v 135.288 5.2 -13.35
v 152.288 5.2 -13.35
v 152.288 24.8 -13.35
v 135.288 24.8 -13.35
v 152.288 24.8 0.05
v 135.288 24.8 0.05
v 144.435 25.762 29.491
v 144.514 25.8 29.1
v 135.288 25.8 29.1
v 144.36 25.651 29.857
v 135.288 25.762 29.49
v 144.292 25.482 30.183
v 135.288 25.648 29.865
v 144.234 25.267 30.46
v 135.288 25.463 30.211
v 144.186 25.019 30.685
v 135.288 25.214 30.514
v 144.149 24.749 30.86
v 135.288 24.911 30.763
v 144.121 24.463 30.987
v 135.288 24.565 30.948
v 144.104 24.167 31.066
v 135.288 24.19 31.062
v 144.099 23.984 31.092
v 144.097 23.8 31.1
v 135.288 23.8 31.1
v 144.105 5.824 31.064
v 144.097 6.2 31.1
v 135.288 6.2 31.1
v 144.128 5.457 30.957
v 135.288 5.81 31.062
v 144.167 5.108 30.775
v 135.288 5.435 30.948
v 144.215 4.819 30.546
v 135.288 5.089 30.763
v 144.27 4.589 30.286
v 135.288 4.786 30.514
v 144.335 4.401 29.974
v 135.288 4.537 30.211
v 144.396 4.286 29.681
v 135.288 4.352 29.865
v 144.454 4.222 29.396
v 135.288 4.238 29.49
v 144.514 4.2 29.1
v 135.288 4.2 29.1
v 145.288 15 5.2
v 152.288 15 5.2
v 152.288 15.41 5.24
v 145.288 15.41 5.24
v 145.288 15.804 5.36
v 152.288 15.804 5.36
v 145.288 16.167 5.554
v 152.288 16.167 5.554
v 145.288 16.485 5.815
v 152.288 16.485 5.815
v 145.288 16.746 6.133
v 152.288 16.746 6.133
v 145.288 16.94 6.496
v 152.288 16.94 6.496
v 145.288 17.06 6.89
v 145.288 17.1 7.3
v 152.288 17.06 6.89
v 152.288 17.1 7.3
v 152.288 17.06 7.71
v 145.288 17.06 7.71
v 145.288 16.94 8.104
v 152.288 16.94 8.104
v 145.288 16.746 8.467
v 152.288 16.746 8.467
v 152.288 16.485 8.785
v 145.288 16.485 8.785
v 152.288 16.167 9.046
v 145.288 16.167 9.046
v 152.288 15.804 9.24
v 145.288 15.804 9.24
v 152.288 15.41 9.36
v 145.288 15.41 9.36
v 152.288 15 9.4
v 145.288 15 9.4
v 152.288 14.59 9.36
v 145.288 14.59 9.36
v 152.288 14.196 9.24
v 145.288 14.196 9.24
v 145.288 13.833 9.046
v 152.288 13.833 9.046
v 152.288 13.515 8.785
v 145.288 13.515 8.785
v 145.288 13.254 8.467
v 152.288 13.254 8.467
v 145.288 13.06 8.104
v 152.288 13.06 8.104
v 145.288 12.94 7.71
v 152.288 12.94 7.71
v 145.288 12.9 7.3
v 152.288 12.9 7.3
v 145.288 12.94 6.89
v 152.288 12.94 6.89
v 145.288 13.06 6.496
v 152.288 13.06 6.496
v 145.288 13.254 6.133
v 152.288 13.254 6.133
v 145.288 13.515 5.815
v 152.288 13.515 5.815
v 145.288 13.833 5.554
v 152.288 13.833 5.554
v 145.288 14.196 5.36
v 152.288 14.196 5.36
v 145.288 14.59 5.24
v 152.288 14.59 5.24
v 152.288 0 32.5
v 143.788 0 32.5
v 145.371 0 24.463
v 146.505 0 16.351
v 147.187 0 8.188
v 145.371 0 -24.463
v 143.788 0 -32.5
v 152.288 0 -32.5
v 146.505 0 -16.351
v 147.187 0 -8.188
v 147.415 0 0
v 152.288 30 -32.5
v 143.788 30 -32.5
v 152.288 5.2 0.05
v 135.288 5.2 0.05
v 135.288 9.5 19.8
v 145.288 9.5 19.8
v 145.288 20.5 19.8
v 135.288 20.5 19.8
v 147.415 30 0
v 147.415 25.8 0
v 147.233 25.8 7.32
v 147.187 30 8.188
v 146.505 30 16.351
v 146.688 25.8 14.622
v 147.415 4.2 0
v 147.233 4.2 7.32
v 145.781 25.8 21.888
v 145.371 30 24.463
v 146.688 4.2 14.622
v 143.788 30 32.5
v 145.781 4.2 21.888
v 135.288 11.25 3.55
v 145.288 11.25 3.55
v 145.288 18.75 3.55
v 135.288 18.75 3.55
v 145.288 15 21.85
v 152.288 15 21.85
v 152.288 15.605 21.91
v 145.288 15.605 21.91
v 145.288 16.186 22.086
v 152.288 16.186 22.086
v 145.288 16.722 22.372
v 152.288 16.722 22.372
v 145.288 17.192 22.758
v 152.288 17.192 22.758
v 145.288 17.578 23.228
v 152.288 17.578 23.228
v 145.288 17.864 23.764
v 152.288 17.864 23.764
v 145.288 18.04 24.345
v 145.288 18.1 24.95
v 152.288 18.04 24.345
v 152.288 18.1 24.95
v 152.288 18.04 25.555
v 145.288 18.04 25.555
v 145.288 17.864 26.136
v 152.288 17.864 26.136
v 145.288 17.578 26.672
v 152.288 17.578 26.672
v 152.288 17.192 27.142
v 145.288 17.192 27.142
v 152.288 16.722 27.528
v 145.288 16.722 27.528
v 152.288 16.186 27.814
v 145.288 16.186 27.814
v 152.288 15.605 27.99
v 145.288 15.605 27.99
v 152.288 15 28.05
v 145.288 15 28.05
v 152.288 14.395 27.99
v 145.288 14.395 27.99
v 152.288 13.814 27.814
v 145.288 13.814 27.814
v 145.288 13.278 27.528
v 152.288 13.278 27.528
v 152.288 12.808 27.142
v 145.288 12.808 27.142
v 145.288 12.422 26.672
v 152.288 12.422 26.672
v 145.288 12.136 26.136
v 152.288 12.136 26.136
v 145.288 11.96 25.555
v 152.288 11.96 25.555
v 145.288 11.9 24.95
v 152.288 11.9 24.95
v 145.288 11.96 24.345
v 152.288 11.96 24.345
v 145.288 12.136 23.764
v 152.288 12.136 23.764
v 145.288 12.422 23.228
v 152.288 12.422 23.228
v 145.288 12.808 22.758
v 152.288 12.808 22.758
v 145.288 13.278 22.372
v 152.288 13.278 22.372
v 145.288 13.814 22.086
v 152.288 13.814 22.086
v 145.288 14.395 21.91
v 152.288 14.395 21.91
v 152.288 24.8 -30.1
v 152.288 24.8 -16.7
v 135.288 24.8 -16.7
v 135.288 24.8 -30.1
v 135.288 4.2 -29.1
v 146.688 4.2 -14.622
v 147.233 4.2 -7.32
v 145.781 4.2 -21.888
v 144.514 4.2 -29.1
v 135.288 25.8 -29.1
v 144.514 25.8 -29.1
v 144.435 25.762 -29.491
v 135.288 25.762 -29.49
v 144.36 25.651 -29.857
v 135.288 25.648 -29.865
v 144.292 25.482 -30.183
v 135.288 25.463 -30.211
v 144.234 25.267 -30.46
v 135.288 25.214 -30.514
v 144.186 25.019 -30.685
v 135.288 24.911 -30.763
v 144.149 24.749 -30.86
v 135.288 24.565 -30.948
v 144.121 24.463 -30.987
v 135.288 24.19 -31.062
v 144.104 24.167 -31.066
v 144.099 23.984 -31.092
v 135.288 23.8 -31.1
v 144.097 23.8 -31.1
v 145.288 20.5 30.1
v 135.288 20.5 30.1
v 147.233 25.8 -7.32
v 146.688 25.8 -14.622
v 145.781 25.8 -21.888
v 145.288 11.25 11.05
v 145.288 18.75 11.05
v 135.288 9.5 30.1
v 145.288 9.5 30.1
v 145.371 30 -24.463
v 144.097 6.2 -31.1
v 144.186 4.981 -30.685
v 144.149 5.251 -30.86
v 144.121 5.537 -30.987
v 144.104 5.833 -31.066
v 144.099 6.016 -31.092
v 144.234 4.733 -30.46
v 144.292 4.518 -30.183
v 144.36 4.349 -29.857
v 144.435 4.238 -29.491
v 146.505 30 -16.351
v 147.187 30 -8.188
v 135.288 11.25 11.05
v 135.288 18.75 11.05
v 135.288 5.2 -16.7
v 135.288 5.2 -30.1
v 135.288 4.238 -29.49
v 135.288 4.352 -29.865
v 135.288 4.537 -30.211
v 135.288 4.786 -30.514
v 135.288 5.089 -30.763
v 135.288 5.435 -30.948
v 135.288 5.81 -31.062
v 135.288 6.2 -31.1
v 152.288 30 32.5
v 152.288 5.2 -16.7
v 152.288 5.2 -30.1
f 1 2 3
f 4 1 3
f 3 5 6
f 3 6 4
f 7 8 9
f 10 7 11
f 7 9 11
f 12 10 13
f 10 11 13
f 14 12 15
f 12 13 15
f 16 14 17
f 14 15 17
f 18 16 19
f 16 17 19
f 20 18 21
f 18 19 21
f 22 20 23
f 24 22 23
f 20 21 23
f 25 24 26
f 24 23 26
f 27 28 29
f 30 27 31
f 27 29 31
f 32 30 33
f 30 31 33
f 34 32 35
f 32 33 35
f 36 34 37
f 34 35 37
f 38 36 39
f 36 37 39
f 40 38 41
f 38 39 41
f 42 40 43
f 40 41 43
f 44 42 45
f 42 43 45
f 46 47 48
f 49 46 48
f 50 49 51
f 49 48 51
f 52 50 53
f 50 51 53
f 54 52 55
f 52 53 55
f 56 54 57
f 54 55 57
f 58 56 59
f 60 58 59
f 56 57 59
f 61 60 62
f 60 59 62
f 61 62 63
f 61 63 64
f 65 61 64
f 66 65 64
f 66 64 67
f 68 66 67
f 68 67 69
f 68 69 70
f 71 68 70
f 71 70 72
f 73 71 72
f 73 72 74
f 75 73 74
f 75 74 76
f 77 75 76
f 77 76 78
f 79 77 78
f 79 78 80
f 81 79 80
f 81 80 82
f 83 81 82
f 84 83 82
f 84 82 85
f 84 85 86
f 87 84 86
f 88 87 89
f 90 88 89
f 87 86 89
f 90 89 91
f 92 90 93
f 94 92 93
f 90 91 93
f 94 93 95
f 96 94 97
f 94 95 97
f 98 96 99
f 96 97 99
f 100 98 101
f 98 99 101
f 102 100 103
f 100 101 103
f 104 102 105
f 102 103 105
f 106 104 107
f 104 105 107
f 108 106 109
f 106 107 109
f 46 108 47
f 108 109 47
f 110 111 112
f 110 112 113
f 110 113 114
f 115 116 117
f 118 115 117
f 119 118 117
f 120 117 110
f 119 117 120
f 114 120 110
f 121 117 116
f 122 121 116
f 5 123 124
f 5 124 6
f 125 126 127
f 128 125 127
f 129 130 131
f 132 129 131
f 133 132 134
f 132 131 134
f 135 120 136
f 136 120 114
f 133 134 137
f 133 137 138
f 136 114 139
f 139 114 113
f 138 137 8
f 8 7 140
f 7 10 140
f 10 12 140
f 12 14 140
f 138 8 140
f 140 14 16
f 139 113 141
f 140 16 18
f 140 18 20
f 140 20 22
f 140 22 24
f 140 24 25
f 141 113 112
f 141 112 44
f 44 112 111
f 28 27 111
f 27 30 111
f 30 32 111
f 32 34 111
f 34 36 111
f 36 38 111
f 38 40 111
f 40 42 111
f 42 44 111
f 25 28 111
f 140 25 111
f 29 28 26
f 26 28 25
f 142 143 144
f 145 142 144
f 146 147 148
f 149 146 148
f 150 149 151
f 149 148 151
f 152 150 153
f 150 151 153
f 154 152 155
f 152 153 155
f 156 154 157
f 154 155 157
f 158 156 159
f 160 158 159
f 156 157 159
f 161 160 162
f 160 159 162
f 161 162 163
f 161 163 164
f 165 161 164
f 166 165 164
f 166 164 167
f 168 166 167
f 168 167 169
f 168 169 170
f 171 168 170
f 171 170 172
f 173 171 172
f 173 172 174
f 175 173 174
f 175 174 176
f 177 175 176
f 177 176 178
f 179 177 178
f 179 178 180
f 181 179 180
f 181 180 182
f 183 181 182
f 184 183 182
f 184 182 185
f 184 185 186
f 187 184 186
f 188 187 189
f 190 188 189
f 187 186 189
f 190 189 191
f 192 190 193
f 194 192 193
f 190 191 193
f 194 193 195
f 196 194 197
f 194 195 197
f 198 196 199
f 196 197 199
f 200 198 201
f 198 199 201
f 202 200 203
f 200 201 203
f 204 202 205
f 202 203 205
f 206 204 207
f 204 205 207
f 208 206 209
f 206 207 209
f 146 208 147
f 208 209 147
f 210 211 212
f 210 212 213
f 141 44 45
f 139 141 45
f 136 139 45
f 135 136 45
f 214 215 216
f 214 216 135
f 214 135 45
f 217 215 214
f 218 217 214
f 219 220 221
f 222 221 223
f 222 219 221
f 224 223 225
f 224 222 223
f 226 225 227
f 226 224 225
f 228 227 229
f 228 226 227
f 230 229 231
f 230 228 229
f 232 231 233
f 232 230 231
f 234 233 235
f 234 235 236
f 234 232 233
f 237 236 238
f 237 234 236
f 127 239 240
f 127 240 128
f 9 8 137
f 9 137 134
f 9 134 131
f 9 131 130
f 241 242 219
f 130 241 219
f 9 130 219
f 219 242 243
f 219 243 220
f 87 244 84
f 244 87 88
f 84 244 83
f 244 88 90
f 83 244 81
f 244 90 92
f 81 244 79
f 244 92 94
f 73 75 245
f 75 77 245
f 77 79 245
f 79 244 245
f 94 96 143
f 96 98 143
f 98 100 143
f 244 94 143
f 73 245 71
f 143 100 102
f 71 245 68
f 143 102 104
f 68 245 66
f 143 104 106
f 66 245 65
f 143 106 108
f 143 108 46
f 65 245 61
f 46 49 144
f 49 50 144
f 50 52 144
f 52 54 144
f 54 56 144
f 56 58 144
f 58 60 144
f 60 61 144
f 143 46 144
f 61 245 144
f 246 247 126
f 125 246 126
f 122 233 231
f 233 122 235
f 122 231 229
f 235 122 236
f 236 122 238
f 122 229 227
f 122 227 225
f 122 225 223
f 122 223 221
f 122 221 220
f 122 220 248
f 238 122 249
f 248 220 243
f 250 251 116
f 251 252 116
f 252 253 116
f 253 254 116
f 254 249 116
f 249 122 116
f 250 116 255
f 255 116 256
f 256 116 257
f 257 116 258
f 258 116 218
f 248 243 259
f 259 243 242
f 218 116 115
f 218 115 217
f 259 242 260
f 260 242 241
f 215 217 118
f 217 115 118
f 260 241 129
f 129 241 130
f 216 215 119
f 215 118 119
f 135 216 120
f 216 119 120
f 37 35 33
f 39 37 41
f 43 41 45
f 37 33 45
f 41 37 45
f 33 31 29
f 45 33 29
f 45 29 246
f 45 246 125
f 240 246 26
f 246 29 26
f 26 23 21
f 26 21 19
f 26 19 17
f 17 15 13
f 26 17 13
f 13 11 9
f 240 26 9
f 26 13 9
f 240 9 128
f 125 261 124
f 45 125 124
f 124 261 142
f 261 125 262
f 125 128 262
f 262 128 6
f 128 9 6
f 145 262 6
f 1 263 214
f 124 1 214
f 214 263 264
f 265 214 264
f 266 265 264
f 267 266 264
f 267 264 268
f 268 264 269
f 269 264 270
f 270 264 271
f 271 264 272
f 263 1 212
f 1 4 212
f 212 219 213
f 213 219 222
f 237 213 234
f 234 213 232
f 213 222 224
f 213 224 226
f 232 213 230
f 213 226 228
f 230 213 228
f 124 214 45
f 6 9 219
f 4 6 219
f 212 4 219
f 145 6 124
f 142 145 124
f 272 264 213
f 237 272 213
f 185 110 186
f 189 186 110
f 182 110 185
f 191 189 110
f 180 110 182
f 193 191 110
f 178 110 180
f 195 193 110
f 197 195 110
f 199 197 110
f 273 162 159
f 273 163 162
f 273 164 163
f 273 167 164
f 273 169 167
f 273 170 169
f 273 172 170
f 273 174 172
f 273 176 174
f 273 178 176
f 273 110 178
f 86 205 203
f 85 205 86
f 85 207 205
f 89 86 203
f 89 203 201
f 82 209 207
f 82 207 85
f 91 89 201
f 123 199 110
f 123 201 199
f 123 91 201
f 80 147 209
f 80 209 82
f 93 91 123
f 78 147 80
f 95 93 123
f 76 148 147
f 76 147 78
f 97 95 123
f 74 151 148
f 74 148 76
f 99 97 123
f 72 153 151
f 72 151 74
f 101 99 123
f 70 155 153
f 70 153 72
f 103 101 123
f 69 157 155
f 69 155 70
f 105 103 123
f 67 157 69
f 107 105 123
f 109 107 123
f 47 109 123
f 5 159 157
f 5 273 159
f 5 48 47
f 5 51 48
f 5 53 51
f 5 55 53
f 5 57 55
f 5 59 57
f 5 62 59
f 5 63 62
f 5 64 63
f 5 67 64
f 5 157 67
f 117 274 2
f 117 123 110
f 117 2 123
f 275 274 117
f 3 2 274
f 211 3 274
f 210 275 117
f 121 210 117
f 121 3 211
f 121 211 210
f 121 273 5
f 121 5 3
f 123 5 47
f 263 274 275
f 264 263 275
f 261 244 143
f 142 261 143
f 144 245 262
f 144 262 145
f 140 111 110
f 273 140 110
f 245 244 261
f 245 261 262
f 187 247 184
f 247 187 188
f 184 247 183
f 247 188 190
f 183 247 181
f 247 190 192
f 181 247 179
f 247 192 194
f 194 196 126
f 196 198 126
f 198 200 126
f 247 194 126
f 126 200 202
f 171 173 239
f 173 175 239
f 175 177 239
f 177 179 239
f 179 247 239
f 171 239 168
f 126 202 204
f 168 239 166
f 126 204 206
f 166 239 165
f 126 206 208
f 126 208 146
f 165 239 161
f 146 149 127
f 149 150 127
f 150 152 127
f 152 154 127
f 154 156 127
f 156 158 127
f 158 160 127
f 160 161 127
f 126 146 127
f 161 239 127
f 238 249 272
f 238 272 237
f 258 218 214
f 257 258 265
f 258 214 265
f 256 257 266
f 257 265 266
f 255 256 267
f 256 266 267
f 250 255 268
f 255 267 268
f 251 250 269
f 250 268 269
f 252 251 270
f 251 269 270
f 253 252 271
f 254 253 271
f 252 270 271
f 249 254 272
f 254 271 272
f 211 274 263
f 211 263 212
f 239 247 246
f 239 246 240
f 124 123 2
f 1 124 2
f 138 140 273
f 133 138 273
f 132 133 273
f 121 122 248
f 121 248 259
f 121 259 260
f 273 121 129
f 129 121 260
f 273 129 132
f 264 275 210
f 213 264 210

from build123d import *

# Parameters (mm, degrees)
BOSS_EXTRUDE1_DEPTH = 30
SKETCH2_W           = 62.2
SKETCH2_H           = 21.6
BOSS_EXTRUDE2_DEPTH = 17
SKETCH2_6_R         = 2.1
SKETCH2_6_R_2       = 3.1
SKETCH2_6_W         = 13.4
SKETCH2_6_H         = 19.6
CUT_EXTRUDE3_DEPTH  = 17
CUT_EXTRUDE5_START  = -7
SKETCH2_8_W         = 7.5
SKETCH2_8_H         = 7.5
SKETCH2_8_R         = 2.1
SKETCH2_8_W_2       = 10.3
SKETCH2_8_H_2       = 11
SKETCH2_8_R_2       = 3.1
CUT_EXTRUDE5_DEPTH  = 10
FILLET1_R           = 2


with BuildPart() as part:
    # Sketch1 → Boss-Extrude1 (new body)
    with BuildSketch(Plane(origin=(0, 0, 0), x_dir=(1, 0, 0), z_dir=(0, 1, 0))):
        with BuildLine():
            Line((152.287802769, 32.5), (143.787802769, 32.5))
            ThreePointArc((143.787802769, 32.5), (146.505394389, 16.350891105), (147.415, 0))
            ThreePointArc((147.415, 0), (146.505394389, -16.350891105), (143.787802769, -32.5))
            Line((143.787802769, -32.5), (152.287802769, -32.5))
            Line((152.287802769, -32.5), (152.287802769, 32.5))
        make_face()
    extrude(amount=BOSS_EXTRUDE1_DEPTH)

    # Sketch2 → Boss-Extrude2 (add)
    with BuildSketch(Plane(origin=(152.287802769, 0, 0), x_dir=(0, 0, -1), z_dir=(1, 0, 0))):
        with Locations((0, 15)):
            Rectangle(SKETCH2_W, SKETCH2_H)
    extrude(amount=-BOSS_EXTRUDE2_DEPTH)

    # Sketch2<6> → Cut-Extrude3 (cut)
    with BuildSketch(Plane(origin=(152.287802769, 0, 0), x_dir=(0, 0, -1), z_dir=(1, 0, 0))):
        with Locations((-7.3, 15)):
            Circle(SKETCH2_6_R)
        with Locations((-24.95, 15)):
            Circle(SKETCH2_6_R_2)
        with Locations((23.4, 15)):
            Rectangle(SKETCH2_6_W, SKETCH2_6_H)
        with Locations((6.65, 15)):
            Rectangle(SKETCH2_6_W, SKETCH2_6_H)
    extrude(amount=-CUT_EXTRUDE3_DEPTH, mode=Mode.SUBTRACT)

    # Sketch2<8> → Cut-Extrude5 (cut)
    with BuildSketch(Plane(origin=(152.287802769, 0, 0), x_dir=(0, 0, -1), z_dir=(1, 0, 0)).offset(CUT_EXTRUDE5_START)):
        with Locations((-7.3, 15)):
            Rectangle(SKETCH2_8_W, SKETCH2_8_H)
        with Locations((-7.3, 15)):
            Circle(SKETCH2_8_R, mode=Mode.SUBTRACT)
        with Locations((-24.95, 15)):
            Rectangle(SKETCH2_8_W_2, SKETCH2_8_H_2)
        with Locations((-24.95, 15)):
            Circle(SKETCH2_8_R_2, mode=Mode.SUBTRACT)
    extrude(amount=-CUT_EXTRUDE5_DEPTH, mode=Mode.SUBTRACT)

    # Fillet1
    fillet1_edges = [part.edges().sort_by_distance(p)[0] for p in [
        (139.692447908, 25.8, 31.1),
        (139.692447908, 25.8, -31.1),
        (139.692447908, 4.2, -31.1),
        (139.692447908, 4.2, 31.1),
    ]]
    fillet(fillet1_edges, radius=FILLET1_R)


solid = part.part
